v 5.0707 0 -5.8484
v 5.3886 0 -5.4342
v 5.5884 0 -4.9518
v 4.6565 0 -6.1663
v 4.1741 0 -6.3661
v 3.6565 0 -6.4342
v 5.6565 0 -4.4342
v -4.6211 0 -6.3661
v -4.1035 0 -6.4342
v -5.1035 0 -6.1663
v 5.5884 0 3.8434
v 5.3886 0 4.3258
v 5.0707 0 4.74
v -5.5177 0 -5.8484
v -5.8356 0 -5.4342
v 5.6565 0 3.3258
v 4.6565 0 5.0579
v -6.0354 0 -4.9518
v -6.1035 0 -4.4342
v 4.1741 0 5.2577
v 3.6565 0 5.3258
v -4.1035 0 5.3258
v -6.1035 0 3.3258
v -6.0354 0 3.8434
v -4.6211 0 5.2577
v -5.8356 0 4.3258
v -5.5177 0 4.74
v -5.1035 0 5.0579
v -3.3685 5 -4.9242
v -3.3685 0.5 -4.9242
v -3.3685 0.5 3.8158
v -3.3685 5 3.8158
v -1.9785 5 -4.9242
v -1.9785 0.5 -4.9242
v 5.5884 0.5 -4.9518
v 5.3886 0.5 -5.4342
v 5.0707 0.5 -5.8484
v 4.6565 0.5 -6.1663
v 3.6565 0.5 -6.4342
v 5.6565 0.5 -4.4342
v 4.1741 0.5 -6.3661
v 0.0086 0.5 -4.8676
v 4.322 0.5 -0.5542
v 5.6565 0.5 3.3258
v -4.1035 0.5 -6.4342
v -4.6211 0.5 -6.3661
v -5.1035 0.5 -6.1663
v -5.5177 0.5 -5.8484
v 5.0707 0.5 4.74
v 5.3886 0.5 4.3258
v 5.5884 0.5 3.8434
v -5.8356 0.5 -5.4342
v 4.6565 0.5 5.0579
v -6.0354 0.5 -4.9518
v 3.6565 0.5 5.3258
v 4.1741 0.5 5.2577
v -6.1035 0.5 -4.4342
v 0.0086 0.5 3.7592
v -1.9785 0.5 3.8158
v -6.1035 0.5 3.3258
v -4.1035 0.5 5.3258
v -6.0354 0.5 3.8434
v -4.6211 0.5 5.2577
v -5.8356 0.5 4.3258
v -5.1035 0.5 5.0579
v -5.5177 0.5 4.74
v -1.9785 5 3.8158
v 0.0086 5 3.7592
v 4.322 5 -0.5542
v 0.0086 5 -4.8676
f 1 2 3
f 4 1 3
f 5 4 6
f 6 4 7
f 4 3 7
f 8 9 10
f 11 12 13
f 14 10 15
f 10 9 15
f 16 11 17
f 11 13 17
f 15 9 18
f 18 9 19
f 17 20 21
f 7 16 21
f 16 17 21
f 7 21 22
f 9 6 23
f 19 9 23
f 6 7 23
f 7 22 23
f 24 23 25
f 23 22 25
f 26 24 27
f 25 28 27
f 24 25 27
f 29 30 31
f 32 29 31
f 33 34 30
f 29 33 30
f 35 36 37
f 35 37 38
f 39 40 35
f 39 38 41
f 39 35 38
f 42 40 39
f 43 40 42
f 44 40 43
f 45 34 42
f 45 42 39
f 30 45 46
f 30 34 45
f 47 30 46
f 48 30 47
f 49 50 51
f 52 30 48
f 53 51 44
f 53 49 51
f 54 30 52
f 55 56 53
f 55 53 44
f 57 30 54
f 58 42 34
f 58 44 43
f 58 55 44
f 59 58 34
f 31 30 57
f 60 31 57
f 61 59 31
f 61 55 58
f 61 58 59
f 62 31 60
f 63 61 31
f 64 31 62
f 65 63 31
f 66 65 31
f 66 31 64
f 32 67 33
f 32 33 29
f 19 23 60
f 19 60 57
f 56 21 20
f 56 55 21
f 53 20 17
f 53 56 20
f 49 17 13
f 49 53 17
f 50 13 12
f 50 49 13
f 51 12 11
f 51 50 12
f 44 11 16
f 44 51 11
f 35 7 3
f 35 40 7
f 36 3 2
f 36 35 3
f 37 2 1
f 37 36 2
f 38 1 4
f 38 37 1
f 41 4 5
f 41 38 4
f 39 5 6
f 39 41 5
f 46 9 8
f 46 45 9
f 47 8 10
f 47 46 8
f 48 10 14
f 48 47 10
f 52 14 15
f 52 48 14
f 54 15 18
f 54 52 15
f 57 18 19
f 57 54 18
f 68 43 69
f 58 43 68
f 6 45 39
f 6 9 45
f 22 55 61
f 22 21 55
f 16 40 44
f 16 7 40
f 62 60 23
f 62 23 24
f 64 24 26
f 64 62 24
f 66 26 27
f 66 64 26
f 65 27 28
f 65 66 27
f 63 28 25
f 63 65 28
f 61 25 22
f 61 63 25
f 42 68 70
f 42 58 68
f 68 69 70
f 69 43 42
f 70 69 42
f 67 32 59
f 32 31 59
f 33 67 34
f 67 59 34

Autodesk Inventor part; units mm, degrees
ref_plane "YZ Plane" through (0, 0, 0) normal (1, 0, 0) x (0, 1, 0)
ref_plane "XZ Plane" through (0, 0, 0) normal (0, 1, 0) x (-1, 0, 0)
ref_plane "XY Plane" through (0, 0, 0) normal (0, 0, 1) x (1, 0, 0)
sketch "Szkic1" plane through (0, 0, 0) normal (0, 1, 0) x (-1, 0, 0)
  line L0 (5.1235, 4.3458) -> (-4.6765, 4.3458)
  line L1 (-4.6765, 4.3458) -> (-4.6765, -5.4542)
  line L2 (-4.6765, -5.4542) -> (5.1235, -5.4542)
  line L3 (5.1235, -5.4542) -> (5.1235, 4.3458)
  line L4 (5.1235, 4.3458) -> (-4.6765, -5.4542) construction
  line L5 (-4.6765, 4.3458) -> (5.1235, -5.4542) construction
  line L6 (0.2235, -0.5542) -> (2.6735, -0.5542)
  line L7 (3.4085, 3.8558) -> (1.9385, 3.8558)
  line L8 (1.9385, 3.8558) -> (1.9385, -4.9642)
  line L9 (1.9385, -4.9642) -> (3.4085, -4.9642)
  line L10 (3.4085, -4.9642) -> (3.4085, 3.8558)
  line L11 (3.4085, 3.8558) -> (1.9385, -4.9642) construction
  line L12 (1.9385, 3.8558) -> (3.4085, -4.9642) construction
  line L13 (0.2235, -0.5542) -> (0.0314, -0.5542)
  line L14 (0.0314, -0.5542) -> (0.0314, -4.9642)
  line L15 (0.0314, -0.5542) -> (-4.3786, -0.5542)
  line L16 (-4.3786, -0.5542) -> (0.0314, -4.9642)
  line L17 (-4.3786, -0.5542) -> (0.0314, 3.8558)
  line L18 (0.0314, -0.5542) -> (0.0314, 3.8558)
  line L19 (-5.6565, 5.3258) -> (6.1035, 5.3258)
  line L20 (6.1035, 5.3258) -> (6.1035, -6.4342)
  line L21 (6.1035, -6.4342) -> (-5.6565, -6.4342)
  line L22 (-5.6565, -6.4342) -> (-5.6565, 5.3258)
  line L23 (-5.6565, 5.3258) -> (6.1035, -6.4342) construction
  line L24 (6.1035, 5.3258) -> (-5.6565, -6.4342) construction
  point P0 (0, 0)
  dimension "d0" = 9.8
  dimension "d1" = 9.8
  dimension "d2" = 2.45
  dimension "d3" = 1.47
  dimension "d4" = 8.82
  dimension "d5" = 0.1921
  dimension "d6" = 4.41
  dimension "d7" = 4.41
  dimension "d8" = 11.76
  dimension "d9" = 11.76
extrude "Wyciągnięcie proste1" add sketch "Szkic1" along normal blind 0.5 contours L3 L2 L1 L0 | L10 L9 L8 L7 | L14 L16 L15 | L15 L17 L18 | L19 L20 L21 L22
extrude "Wyciągnięcie proste2" add sketch "Szkic1" along normal blind 5 contours L10 L9 L8 L7 | L14 L16 L15 | L15 L17 L18
fillet "Zaokrąglenie1" radius 2 4 edges at (5.6565, 0.25, 5.3258) (-6.1035, 0.25, 5.3258) (5.6565, 0.25, -6.4342) (-6.1035, 0.25, -6.4342)
offset faces "Rozmiar1" outward -0.04 faces at (-1.9385, 2, 0.9158) (-2.4285, 2, -4.9642) (-3.4085, 2, -2.0242) (-2.9185, 2, 3.8558) (-0.0314, 2, -2.0242) (1.4386, 2, 2.3858) (2.9086, 2, -2.0242)
properties part number "guzik_stop"
